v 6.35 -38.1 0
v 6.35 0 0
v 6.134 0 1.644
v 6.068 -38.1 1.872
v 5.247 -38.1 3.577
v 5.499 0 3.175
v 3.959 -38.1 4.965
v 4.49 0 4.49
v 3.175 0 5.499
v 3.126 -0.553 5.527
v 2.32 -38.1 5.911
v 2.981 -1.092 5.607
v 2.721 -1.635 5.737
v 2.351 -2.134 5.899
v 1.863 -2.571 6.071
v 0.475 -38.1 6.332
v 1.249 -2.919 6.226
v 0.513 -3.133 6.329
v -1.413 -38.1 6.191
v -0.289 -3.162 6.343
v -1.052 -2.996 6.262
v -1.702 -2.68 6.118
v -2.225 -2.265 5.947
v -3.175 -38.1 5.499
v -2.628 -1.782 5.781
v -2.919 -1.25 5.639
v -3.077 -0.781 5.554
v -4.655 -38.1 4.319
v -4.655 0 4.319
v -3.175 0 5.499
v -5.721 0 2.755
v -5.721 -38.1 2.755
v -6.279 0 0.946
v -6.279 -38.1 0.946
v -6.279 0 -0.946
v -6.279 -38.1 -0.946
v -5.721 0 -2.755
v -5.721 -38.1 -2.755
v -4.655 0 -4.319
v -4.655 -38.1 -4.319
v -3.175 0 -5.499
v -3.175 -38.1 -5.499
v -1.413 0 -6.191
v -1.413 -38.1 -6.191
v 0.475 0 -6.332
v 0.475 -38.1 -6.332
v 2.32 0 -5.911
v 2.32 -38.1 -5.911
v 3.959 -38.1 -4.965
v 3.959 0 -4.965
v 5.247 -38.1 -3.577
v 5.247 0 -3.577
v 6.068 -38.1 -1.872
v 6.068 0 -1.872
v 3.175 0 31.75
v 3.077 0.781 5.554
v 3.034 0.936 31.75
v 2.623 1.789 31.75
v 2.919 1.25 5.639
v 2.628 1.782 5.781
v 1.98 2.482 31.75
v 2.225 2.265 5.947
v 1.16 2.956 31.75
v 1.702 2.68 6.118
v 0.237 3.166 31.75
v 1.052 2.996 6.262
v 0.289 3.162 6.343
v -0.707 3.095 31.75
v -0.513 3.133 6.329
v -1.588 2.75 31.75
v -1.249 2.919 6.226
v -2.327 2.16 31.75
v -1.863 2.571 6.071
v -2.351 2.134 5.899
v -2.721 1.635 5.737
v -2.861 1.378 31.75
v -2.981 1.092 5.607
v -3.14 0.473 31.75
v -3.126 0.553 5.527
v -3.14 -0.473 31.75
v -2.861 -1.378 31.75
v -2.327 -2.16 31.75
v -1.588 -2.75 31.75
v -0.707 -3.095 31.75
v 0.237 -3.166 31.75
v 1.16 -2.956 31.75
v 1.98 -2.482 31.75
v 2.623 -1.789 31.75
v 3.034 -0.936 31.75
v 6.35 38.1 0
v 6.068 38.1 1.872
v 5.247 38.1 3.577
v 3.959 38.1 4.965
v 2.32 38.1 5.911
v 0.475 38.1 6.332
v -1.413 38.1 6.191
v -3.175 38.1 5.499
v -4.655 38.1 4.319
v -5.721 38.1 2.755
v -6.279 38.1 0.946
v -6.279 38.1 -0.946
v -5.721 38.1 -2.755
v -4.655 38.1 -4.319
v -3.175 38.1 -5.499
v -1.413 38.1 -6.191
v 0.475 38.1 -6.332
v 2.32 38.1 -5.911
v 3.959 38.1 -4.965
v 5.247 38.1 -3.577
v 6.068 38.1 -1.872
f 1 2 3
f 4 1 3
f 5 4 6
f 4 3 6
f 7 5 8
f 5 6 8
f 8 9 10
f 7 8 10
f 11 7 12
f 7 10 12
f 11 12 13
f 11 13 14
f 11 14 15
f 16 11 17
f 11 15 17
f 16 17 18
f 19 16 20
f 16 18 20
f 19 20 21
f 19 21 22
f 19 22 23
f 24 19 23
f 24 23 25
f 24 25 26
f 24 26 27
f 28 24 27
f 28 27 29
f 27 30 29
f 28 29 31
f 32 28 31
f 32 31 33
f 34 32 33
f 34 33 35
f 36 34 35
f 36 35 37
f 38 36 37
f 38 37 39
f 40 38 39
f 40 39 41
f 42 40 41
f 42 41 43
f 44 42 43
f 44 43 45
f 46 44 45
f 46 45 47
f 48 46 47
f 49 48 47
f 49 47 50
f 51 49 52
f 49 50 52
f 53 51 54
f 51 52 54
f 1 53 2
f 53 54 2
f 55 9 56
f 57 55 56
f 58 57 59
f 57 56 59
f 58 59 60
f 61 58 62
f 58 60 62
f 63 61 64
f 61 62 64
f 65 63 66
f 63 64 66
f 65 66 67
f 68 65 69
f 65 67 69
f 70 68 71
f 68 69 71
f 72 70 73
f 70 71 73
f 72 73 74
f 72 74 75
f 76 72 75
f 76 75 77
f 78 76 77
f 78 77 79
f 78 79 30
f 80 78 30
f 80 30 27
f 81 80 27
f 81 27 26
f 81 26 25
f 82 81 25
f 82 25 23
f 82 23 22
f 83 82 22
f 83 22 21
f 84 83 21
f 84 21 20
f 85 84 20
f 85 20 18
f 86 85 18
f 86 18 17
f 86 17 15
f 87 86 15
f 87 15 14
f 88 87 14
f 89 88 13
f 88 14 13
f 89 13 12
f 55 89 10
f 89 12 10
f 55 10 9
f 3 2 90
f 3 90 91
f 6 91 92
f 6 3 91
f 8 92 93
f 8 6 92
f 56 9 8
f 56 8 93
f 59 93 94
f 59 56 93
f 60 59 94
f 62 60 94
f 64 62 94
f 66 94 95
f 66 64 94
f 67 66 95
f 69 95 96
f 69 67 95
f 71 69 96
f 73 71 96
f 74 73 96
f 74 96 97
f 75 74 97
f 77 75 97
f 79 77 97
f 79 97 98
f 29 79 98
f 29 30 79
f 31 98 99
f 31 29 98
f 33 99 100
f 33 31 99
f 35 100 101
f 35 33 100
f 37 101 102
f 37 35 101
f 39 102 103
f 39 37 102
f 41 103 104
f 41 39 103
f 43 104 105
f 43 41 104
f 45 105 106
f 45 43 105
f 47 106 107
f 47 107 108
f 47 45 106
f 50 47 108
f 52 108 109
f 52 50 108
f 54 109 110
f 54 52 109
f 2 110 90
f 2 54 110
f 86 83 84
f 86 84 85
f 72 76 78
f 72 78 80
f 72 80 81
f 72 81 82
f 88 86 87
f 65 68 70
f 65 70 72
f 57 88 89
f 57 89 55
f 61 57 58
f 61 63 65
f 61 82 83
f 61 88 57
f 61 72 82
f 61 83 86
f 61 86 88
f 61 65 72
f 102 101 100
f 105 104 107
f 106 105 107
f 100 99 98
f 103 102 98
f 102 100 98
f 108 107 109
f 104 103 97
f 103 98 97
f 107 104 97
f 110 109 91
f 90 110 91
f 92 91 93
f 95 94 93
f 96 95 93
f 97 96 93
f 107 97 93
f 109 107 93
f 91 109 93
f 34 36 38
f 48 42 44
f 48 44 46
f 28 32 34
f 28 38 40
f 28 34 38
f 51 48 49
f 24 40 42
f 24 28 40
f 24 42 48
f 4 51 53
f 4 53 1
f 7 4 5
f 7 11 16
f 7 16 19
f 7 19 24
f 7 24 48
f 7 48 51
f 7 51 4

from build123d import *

# Parameters (mm, degrees)
F1_R     = 3.175
F2_DEPTH = 31.75
F0_R     = 6.35
F3_DEPTH = 38.1
F4_DEPTH = 38.1


with BuildPart() as f2:
    # F1 (on Top) → F2 (new body)
    with BuildSketch(Plane.XY):
        Circle(F1_R)
    extrude(amount=F2_DEPTH)

    # F0 (on Front) → F3 (join)
    with BuildSketch(Plane.XZ):
        Circle(F0_R)
    extrude(amount=F3_DEPTH)

    # F0 (on Front) → F4 (join)
    with BuildSketch(Plane.XZ):
        Circle(F0_R)
    extrude(amount=-F4_DEPTH)


solid = f2.part
